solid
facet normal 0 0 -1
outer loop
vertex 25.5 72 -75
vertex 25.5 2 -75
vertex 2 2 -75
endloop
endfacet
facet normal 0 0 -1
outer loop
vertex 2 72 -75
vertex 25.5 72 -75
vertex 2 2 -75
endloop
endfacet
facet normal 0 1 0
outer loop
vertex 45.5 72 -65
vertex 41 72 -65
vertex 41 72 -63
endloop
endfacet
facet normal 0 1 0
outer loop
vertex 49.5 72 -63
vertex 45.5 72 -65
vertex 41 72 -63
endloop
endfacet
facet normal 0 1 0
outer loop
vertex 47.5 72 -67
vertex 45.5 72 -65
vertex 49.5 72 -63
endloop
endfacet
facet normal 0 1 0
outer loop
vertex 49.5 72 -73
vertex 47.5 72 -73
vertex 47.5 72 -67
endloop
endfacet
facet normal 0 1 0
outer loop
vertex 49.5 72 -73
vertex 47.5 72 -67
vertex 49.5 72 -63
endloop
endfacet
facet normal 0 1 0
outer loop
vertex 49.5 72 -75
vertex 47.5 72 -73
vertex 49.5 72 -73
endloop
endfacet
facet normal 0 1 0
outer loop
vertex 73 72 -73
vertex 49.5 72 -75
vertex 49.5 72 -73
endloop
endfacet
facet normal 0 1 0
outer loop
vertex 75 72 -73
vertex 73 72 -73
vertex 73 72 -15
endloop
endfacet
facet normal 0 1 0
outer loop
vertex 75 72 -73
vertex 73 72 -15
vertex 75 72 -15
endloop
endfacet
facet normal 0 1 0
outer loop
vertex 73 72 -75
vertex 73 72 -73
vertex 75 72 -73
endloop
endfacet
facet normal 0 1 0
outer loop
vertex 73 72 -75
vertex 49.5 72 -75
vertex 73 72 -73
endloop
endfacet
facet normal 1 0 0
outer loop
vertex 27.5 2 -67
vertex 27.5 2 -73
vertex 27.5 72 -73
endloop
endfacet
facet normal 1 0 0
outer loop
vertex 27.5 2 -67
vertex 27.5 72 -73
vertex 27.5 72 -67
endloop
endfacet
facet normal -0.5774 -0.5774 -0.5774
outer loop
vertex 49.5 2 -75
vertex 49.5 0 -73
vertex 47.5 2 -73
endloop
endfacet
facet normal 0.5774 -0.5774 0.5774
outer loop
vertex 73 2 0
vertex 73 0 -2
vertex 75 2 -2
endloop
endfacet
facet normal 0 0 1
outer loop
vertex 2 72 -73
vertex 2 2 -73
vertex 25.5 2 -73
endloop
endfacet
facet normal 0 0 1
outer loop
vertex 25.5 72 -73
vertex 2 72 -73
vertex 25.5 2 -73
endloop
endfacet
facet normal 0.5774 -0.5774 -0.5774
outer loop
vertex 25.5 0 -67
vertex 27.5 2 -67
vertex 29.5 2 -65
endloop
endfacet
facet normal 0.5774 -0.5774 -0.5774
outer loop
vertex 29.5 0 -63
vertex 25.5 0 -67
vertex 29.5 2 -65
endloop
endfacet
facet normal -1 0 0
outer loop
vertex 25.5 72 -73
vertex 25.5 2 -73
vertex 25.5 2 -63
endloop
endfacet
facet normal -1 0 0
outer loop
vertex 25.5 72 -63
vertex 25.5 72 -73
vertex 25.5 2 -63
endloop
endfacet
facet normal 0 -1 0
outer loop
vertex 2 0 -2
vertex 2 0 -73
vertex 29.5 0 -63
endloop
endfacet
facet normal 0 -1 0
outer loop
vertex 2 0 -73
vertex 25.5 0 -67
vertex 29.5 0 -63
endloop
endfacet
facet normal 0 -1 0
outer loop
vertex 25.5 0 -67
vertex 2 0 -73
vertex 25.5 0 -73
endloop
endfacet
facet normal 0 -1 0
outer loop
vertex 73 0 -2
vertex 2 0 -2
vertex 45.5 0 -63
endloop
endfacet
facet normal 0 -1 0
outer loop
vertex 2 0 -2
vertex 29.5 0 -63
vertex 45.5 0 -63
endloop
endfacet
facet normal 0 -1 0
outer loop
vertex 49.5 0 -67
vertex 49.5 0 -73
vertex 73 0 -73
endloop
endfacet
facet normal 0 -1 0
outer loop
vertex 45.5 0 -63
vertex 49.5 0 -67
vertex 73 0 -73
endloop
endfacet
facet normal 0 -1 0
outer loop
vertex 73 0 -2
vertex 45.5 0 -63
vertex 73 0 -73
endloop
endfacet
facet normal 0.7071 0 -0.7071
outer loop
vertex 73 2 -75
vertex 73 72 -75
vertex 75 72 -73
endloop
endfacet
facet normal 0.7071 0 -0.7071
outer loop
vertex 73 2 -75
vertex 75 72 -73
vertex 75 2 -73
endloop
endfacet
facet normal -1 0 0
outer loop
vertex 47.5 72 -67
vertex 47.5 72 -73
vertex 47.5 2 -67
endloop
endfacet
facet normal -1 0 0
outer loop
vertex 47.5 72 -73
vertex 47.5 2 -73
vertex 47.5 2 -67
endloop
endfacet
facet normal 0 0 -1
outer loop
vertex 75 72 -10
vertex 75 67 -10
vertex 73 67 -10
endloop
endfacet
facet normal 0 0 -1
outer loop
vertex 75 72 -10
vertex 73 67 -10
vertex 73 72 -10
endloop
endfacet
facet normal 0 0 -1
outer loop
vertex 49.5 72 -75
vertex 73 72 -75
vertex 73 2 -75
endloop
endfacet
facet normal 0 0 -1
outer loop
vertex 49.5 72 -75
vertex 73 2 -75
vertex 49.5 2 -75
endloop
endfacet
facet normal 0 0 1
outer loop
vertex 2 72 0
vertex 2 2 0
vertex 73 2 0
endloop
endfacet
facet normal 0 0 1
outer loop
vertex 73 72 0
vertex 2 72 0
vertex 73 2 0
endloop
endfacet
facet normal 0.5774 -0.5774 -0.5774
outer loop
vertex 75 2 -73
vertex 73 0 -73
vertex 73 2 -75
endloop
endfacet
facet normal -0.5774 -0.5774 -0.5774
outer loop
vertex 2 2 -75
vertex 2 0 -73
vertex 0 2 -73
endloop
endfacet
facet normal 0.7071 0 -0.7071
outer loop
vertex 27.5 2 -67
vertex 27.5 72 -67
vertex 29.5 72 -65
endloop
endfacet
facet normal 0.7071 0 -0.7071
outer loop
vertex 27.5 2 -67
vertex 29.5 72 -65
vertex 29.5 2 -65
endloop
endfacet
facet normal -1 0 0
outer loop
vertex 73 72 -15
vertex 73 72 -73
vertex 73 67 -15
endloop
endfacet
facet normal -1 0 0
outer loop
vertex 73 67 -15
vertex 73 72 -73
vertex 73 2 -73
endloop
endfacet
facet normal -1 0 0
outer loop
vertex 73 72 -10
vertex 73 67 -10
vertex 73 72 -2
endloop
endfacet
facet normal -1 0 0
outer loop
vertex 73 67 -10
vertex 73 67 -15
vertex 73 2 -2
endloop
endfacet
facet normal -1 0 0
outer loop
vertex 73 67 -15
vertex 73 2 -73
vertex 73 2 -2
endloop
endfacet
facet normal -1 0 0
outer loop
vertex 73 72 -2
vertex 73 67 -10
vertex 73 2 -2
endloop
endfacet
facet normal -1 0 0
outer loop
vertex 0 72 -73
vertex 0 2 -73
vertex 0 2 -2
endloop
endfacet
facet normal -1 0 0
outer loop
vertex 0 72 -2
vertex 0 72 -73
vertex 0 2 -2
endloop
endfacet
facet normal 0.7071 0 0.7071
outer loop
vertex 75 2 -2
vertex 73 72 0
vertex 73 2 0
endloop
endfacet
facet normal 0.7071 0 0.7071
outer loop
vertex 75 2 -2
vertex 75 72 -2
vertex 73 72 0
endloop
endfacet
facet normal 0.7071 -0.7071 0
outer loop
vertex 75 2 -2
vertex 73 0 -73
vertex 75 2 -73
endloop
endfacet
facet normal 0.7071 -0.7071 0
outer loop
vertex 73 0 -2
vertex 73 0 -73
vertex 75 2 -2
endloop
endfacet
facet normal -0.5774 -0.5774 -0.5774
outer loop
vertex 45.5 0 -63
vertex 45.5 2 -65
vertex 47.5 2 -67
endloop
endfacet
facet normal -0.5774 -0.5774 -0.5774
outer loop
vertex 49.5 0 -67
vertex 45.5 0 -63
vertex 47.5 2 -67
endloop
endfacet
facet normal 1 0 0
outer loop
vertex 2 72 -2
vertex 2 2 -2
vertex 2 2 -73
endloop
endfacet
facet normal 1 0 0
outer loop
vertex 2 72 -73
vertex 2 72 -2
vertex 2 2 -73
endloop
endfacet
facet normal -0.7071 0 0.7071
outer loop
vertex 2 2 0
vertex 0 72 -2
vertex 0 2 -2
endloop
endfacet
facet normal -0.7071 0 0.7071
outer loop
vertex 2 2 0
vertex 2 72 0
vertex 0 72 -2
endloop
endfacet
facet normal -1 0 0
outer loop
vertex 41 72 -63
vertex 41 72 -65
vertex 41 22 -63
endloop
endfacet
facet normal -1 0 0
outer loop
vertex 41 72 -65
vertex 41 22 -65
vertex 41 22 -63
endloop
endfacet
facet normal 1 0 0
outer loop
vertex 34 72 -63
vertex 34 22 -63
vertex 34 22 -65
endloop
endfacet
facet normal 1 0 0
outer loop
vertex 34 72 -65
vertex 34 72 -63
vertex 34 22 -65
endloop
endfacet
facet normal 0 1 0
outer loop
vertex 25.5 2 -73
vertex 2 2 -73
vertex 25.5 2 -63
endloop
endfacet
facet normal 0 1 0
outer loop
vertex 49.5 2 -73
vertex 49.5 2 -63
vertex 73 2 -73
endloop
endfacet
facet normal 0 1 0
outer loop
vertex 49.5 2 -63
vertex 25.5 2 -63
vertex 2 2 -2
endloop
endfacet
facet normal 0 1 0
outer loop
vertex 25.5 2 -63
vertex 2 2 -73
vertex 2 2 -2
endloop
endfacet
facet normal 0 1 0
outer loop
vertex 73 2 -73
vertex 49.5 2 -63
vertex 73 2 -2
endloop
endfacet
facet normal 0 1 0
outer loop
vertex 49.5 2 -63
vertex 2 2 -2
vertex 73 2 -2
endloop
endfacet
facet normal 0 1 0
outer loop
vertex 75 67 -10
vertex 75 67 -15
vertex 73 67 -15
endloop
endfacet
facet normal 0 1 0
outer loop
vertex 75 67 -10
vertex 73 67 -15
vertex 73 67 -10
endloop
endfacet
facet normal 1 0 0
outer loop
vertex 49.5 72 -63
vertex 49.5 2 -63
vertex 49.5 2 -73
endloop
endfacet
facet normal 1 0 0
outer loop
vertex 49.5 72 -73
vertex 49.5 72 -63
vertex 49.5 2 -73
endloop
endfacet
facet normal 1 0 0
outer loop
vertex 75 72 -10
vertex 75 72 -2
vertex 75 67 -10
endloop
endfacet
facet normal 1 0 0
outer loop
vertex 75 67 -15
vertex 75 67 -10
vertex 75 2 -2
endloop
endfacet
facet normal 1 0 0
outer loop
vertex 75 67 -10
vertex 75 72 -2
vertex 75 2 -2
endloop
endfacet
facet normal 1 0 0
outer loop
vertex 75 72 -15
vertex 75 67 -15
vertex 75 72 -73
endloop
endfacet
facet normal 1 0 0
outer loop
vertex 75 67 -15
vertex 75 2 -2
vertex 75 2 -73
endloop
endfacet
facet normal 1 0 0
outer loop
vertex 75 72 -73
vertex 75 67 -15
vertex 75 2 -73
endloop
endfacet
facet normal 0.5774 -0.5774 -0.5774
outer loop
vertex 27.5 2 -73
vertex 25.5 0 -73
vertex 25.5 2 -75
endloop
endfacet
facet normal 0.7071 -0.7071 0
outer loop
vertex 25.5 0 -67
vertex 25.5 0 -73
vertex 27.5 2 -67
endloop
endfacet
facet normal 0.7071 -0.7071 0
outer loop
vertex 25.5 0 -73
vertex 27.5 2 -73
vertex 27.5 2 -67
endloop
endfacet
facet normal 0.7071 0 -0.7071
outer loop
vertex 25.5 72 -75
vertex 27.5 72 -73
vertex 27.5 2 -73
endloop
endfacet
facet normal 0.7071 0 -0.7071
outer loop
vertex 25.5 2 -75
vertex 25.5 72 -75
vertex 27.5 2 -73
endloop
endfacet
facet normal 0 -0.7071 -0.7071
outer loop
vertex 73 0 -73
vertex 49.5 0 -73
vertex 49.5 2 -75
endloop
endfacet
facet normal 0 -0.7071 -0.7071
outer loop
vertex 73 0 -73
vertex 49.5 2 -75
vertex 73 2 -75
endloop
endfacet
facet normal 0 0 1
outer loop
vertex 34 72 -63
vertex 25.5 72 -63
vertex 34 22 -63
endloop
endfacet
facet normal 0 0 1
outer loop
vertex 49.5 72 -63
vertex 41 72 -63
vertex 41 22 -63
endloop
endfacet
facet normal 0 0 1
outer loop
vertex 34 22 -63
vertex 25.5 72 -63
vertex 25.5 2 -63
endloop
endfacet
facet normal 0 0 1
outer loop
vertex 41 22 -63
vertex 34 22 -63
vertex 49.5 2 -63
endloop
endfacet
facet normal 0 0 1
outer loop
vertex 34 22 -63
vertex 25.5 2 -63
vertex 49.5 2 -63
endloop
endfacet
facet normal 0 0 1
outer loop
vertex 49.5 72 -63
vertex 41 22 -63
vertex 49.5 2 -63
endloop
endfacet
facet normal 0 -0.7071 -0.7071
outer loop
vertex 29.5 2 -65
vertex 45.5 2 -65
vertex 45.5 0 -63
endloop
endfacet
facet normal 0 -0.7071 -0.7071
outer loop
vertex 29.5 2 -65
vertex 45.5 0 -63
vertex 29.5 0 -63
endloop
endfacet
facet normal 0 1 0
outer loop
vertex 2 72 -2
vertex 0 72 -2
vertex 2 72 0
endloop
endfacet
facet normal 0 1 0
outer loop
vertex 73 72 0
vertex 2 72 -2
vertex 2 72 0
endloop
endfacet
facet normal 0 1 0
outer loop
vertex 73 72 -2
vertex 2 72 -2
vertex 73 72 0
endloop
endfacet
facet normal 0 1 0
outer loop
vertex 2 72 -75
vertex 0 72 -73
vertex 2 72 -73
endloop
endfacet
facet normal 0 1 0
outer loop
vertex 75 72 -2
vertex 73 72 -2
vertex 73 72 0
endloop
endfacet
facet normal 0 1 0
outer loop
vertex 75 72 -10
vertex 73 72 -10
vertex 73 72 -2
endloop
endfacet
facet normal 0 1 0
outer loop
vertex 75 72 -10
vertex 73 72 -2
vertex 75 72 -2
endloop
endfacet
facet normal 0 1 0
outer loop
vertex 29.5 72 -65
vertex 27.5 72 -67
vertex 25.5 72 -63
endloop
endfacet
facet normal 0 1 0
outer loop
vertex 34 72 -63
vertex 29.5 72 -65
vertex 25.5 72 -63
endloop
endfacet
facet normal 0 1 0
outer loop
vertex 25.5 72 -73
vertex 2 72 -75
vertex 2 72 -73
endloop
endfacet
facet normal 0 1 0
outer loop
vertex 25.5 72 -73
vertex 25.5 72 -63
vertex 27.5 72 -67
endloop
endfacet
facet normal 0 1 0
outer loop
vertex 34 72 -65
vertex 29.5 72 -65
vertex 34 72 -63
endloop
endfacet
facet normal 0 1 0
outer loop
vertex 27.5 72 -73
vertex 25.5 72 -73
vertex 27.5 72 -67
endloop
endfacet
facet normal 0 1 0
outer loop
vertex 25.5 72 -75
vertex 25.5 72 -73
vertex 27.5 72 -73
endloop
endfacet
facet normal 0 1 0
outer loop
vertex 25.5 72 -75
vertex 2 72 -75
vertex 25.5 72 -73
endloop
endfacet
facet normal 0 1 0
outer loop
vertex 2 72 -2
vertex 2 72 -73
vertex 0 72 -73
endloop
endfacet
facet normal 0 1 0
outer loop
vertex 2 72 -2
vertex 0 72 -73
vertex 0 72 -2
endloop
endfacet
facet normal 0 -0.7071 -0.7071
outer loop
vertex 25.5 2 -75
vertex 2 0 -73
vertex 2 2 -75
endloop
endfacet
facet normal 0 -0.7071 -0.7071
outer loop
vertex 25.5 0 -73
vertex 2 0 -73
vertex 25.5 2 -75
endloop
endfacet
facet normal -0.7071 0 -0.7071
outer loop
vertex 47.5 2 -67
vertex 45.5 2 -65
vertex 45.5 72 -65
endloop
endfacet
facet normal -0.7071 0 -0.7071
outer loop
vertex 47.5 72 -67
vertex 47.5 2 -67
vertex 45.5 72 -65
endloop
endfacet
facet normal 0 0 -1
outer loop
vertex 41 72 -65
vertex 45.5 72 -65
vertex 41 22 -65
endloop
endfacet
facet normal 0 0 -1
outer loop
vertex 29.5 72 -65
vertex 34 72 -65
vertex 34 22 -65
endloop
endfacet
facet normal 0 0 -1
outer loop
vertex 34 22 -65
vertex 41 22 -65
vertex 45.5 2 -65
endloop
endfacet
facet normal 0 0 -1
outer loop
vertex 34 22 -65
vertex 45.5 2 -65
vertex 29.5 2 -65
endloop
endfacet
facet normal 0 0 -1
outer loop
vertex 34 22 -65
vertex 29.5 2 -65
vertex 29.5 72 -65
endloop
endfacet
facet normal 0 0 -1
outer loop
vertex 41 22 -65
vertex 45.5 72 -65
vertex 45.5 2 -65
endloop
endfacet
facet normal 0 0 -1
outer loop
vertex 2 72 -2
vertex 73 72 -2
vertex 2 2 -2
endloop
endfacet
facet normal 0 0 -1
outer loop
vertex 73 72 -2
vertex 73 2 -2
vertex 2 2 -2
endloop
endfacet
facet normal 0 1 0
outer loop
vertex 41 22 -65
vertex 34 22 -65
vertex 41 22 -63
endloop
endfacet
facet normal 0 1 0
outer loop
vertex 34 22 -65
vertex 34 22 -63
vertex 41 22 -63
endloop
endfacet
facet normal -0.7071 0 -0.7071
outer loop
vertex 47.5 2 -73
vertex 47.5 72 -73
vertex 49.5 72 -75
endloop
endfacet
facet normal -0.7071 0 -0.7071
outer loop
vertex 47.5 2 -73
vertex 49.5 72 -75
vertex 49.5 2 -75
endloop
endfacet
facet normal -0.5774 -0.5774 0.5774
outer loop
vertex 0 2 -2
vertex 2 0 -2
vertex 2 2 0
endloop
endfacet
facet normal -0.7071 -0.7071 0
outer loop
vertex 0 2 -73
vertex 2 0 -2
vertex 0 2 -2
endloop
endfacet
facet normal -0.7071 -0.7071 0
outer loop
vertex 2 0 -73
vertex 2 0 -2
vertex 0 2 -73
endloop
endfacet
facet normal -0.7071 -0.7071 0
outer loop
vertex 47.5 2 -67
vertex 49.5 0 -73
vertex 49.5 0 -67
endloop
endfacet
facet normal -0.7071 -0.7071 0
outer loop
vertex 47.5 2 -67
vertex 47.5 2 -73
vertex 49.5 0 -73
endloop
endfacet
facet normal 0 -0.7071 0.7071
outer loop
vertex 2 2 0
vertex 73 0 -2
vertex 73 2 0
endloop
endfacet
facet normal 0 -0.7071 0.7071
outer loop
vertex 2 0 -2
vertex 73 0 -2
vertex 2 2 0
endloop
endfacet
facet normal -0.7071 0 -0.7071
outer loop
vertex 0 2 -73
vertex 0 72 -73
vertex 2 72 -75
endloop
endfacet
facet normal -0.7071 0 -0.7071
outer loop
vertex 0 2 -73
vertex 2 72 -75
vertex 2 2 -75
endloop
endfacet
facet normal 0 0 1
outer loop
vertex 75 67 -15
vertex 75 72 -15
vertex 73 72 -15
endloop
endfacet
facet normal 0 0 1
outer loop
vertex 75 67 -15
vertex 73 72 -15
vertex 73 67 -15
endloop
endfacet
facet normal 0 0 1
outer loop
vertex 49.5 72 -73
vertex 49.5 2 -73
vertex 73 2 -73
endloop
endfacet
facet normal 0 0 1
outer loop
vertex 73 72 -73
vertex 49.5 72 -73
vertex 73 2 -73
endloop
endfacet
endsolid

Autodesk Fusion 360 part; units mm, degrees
sketch "Sketch1" plane through (0, 0, 0) normal (0, 1, 0) x (1, 0, 0)
  line L0 (0, 0) -> (75, 0)
  line L1 (75, 0) -> (75, 75)
  line L2 (75, 75) -> (0, 75)
  line L3 (0, 75) -> (0, 0)
  dimension "d1" = 75
  dimension "d2" = 75
extrude "Extrude1" add sketch "Sketch1" along normal blind 72
sketch "Sketch2" plane through (0, 0, 0) normal (0, -1, 0) x (1, 0, 0)
  line L0 (0, 0) -> (0, -75)
  line L1 (0, -75) -> (75, -75)
  line L2 (75, -75) -> (75, 0)
  line L3 (75, 0) -> (0, 0)
  line L4 (2, -73) -> (73, -73)
  line L5 (73, -73) -> (73, -2)
  line L6 (73, -2) -> (2, -2)
  line L7 (2, -2) -> (2, -73)
  line L8 (27.5, -75) -> (27.5, -73)
  line L9 (47.5, -75) -> (47.5, -73)
  line L10 (27.5, -73) -> (27.5, -65)
  line L11 (47.5, -73) -> (47.5, -65)
  line L12 (47.5, -65) -> (27.5, -65)
  line L13 (27.5, -73) -> (25.5, -73)
  line L14 (25.5, -73) -> (25.5, -63)
  line L15 (25.5, -63) -> (49.5, -63)
  line L16 (49.5, -63) -> (49.5, -73)
  line L17 (34, -65) -> (41, -65)
  line L18 (41, -65) -> (41, -61)
  line L19 (41, -61) -> (34, -61)
  line L20 (34, -61) -> (34, -65)
  line L21 (34, -65) -> (41, -61) construction
  line L22 (41, -65) -> (34, -61) construction
  point P0 (37.5, -63)
  dimension "d7" = -2
  dimension "d9" = 24
extrude "Extrude2" cut sketch "Sketch2" against normal blind 70 from surface at -2 contours L4 L5 L6 L7 L14 L15 L16 L18 L19 L20 | L15 L18 L19 L20
extrude "Extrude3" cut sketch "Sketch2" against normal blind 72 contours L1 L4 L8 L9 | L4 L10 L11 L12 L17
extrude "Extrude4" cut sketch "Sketch2" against normal blind 50 from surface at -22 contours L12 L15 L17 L18 L20
sketch "Sketch3" plane through (75, 0, 0) normal (1, 0, 0) x (0, 1, 0)
  line L0 (0, 0) -> (0, -75)
  line L1 (0, -75) -> (72, -75)
  line L2 (72, -75) -> (72, 0)
  line L3 (72, 0) -> (0, 0)
  line L4 (67, -10) -> (72, -10)
  line L5 (72, -10) -> (72, -15)
  line L6 (72, -15) -> (67, -15)
  line L7 (67, -15) -> (67, -10)
  dimension "d18" = 5
extrude "Extrude5" cut sketch "Sketch3" against normal blind 2 contours L2 L4 L5 L6 L7
chamfer "Chamfer1" distance 2 angle 45 1 edges at (13.75, 0, -75) measured on face at (18.3333, 48, -75)
chamfer "Chamfer1" distance 2 angle 45 1 edges at (27.5, 0, -70) measured on face at (40.8333, 0, -21.6667)
chamfer "Chamfer1" distance 2 angle 45 6 edges at (37.5, 0, -65) (47.5, 0, -70) (61.25, 0, -75) (75, 0, -37.5) (0, 0, -37.5) (37.5, 0, 0) measured on face at (40.8333, 0, -21.6667) measured on face at (40.8333, 0, -21.6667) measured on face at (65.8333, 48, -75) measured on face at (75, 22.3333, -30) measured on face at (0, 24, -50) measured on face at (25, 24, 0)
chamfer "Chamfer1" distance 2 angle 45 6 edges at (75, 36, -75) (47.5, 36, -75) (27.5, 36, -75) (0, 36, -75) (75, 36, 0) (0, 36, 0) measured on face at (75, 22.3333, -30) measured on face at (65.8333, 48, -75) measured on face at (18.3333, 48, -75) measured on face at (18.3333, 48, -75) measured on face at (25, 24, 0) measured on face at (0, 24, -50)
chamfer "Chamfer1" distance 2 angle 45 2 edges at (47.5, 36, -65) (27.5, 36, -65) measured on face at (47.5, 24, -71.6667) measured on face at (38.6667, 7.3333, -65)
